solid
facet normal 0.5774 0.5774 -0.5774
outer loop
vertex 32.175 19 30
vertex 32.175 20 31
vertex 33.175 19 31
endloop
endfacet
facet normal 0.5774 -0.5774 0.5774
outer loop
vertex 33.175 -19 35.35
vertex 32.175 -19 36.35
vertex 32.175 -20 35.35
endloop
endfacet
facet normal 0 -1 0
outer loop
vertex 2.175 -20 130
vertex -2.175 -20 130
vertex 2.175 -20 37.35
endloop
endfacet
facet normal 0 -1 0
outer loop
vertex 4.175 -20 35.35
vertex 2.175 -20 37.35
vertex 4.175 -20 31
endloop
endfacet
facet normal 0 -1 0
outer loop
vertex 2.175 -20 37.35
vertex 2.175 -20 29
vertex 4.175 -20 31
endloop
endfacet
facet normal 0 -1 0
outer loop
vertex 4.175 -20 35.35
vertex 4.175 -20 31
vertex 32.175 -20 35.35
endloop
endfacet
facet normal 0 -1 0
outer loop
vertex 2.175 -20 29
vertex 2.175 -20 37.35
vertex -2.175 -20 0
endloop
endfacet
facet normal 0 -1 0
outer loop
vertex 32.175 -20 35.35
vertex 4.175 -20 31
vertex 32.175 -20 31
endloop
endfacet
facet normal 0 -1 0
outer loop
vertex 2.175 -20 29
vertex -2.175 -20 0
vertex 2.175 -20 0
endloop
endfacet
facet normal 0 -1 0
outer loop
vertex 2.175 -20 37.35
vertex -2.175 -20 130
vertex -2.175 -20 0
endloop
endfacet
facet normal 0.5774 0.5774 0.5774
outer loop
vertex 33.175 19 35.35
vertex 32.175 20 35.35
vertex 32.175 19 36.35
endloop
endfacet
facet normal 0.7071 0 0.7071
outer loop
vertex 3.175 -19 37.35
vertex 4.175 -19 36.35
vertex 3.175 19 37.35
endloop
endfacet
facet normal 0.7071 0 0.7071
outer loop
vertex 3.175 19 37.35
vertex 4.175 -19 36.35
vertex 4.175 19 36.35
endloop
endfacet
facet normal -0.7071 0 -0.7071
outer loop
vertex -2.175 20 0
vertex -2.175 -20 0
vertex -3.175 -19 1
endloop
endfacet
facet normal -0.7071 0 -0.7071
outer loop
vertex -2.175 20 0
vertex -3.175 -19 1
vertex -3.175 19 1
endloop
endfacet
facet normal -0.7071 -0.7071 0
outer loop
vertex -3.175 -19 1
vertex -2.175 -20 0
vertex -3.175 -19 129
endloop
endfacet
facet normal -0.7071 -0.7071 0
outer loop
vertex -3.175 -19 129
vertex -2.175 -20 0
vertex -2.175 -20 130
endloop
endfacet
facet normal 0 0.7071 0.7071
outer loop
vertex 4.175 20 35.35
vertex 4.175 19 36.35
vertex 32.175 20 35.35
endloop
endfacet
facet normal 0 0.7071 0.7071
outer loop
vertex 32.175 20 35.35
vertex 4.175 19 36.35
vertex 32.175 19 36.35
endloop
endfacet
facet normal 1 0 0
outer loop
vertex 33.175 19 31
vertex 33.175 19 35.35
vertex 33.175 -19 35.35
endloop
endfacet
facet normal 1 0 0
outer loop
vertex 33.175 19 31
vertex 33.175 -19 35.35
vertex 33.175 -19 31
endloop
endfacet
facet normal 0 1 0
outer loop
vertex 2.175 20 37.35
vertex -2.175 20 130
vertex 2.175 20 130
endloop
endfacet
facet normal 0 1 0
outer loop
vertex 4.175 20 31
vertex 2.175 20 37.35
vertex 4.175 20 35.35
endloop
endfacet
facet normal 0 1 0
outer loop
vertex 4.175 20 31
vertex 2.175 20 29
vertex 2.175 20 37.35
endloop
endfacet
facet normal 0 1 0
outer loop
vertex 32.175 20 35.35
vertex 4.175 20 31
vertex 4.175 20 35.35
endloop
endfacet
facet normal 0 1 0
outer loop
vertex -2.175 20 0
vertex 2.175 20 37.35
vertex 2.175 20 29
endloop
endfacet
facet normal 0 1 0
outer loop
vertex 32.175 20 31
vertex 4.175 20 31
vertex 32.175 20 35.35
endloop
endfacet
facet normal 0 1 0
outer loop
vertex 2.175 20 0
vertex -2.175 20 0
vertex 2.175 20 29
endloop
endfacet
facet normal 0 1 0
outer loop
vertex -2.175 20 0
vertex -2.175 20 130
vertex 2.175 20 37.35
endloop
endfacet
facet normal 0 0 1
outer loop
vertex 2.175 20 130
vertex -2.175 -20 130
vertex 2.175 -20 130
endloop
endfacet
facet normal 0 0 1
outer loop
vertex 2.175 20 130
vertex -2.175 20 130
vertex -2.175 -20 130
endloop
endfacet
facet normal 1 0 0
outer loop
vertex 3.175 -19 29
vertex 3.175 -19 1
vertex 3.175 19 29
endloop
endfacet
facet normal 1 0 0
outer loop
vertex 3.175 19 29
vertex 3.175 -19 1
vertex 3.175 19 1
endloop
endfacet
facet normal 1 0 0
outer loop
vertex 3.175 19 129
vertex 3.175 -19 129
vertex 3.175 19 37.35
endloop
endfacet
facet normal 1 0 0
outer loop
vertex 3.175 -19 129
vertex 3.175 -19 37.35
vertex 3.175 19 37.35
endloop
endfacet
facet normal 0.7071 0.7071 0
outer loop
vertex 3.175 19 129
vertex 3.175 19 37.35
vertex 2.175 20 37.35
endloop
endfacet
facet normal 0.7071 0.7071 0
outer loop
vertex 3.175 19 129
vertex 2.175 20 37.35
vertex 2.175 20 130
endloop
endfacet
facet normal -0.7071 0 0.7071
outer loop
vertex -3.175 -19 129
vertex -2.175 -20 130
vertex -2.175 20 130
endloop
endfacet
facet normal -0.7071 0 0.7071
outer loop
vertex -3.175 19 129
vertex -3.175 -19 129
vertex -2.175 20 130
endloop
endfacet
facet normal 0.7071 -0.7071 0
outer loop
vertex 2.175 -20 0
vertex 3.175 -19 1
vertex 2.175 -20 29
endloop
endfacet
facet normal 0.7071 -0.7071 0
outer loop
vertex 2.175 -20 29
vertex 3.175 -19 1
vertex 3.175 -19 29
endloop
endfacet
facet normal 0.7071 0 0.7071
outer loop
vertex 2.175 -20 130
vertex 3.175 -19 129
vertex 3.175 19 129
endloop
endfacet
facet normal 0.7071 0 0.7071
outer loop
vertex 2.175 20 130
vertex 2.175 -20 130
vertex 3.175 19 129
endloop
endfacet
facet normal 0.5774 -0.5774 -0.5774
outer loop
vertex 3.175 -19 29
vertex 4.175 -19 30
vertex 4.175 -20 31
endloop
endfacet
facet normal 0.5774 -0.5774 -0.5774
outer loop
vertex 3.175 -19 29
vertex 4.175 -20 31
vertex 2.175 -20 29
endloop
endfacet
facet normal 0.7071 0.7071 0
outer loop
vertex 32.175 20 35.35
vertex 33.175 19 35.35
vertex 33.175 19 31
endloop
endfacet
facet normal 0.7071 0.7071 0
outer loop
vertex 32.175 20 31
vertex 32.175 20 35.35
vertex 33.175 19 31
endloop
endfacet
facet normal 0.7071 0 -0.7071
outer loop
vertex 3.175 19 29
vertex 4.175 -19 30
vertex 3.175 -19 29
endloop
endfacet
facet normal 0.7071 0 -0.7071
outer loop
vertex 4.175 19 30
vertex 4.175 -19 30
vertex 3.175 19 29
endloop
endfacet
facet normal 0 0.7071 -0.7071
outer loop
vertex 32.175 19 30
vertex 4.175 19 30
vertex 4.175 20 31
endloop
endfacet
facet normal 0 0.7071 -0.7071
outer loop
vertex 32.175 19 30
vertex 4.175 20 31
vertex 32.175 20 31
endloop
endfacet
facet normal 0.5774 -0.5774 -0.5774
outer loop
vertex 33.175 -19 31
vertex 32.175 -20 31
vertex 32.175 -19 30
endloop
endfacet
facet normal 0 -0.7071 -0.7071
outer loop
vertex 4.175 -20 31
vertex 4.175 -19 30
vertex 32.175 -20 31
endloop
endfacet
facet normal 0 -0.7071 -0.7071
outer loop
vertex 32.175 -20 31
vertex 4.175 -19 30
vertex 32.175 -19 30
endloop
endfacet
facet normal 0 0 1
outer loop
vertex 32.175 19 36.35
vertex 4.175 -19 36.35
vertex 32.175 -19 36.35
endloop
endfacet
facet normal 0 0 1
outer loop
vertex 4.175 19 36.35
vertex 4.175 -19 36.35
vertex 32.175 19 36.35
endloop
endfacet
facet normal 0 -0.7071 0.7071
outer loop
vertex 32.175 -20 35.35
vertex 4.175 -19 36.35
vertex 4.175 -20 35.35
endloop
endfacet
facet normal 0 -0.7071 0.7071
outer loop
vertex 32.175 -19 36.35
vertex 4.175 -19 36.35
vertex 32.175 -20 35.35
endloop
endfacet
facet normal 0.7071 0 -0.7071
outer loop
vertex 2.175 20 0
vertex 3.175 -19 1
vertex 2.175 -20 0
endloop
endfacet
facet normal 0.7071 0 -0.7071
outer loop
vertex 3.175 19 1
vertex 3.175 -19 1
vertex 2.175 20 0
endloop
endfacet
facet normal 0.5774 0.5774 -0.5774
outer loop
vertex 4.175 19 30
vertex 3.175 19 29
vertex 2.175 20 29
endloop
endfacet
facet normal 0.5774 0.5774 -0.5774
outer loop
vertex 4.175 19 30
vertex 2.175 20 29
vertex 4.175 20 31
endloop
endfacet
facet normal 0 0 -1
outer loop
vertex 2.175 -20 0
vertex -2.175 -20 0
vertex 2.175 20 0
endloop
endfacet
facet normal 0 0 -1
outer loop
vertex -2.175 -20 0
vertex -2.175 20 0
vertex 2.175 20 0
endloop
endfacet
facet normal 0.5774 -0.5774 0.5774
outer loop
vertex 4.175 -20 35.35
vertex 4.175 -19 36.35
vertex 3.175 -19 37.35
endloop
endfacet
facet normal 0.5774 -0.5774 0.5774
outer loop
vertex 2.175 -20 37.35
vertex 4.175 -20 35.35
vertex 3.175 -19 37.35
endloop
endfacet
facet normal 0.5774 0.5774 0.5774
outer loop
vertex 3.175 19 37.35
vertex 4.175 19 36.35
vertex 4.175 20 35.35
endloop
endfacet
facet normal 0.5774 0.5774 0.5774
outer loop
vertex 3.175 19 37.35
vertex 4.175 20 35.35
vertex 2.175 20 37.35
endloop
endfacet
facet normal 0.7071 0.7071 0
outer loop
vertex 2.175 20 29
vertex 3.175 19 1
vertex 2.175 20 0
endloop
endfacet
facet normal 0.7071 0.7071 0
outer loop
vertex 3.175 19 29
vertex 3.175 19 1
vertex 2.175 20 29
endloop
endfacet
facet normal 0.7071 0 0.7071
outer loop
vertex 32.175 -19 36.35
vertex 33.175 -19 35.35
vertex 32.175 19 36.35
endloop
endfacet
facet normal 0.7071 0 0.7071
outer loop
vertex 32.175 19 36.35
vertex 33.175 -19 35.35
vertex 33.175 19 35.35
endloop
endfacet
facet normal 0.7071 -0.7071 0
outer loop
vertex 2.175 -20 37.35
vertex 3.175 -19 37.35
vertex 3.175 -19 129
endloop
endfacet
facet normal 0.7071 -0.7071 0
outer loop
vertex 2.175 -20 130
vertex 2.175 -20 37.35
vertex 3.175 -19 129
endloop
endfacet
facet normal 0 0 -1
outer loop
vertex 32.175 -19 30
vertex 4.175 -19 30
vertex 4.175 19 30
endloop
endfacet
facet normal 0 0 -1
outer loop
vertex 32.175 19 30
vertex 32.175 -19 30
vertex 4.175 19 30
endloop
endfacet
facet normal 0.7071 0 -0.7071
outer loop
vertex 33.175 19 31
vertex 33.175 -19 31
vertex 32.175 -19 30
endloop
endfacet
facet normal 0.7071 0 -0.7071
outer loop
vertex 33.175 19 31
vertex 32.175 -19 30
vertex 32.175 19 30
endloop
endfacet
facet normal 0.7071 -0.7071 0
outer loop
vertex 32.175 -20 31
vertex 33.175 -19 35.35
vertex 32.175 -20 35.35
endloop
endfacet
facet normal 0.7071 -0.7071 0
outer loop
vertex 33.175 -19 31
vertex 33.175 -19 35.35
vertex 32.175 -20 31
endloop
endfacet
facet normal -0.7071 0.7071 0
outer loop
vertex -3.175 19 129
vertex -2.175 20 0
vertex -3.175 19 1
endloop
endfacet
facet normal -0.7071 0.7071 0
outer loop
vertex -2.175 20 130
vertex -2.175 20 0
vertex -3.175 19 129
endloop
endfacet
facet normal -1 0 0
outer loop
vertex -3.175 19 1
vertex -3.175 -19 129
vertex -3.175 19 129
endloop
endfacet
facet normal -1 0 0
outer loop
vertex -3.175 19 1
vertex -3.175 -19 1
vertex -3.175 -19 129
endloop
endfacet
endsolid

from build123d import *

# Parameters (mm, degrees)
CROQUIS1_W              = 6.35
CROQUIS1_H              = 40
SALIENTE_EXTRUIR1_DEPTH = 130
CROQUIS2_W              = 6.35
CROQUIS2_H              = 40
SALIENTE_EXTRUIR2_DEPTH = 30
CHAFL_N1_SIZE           = 1


with BuildPart() as part:
    # Croquis1 → Saliente-Extruir1 (new body)
    with BuildSketch(Plane.XY):
        Rectangle(CROQUIS1_W, CROQUIS1_H)
    extrude(amount=SALIENTE_EXTRUIR1_DEPTH)

    # Croquis2 → Saliente-Extruir2 (add)
    with BuildSketch(Plane(origin=(3.175, 0, 0), x_dir=(0, 0, -1), z_dir=(1, 0, 0))):
        with Locations((-33.175, 0)):
            Rectangle(CROQUIS2_W, CROQUIS2_H)
    extrude(amount=SALIENTE_EXTRUIR2_DEPTH)

    # Chaflán1
    chafl_n1_edges = [part.edges().sort_by_distance(p)[0] for p in [
        (3.175, 0, 130),
        (3.175, 20, 15),
        (3.175, -20, 15),
        (18.175, 20, 30),
        (3.175, 0, 36.35),
        (18.175, 20, 36.35),
        (18.175, -20, 36.35),
        (3.175, 0, 30),
        (18.175, -20, 30),
        (33.175, 20, 33.175),
        (33.175, 0, 36.35),
        (33.175, -20, 33.175),
        (33.175, 0, 30),
        (-3.175, 0, 130),
        (3.175, 0, 0),
        (-3.175, 0, 0),
        (-3.175, 20, 65),
        (3.175, 20, 83.175),
        (3.175, -20, 83.175),
        (-3.175, -20, 65),
    ]]
    chamfer(chafl_n1_edges, length=CHAFL_N1_SIZE)


solid = part.part
